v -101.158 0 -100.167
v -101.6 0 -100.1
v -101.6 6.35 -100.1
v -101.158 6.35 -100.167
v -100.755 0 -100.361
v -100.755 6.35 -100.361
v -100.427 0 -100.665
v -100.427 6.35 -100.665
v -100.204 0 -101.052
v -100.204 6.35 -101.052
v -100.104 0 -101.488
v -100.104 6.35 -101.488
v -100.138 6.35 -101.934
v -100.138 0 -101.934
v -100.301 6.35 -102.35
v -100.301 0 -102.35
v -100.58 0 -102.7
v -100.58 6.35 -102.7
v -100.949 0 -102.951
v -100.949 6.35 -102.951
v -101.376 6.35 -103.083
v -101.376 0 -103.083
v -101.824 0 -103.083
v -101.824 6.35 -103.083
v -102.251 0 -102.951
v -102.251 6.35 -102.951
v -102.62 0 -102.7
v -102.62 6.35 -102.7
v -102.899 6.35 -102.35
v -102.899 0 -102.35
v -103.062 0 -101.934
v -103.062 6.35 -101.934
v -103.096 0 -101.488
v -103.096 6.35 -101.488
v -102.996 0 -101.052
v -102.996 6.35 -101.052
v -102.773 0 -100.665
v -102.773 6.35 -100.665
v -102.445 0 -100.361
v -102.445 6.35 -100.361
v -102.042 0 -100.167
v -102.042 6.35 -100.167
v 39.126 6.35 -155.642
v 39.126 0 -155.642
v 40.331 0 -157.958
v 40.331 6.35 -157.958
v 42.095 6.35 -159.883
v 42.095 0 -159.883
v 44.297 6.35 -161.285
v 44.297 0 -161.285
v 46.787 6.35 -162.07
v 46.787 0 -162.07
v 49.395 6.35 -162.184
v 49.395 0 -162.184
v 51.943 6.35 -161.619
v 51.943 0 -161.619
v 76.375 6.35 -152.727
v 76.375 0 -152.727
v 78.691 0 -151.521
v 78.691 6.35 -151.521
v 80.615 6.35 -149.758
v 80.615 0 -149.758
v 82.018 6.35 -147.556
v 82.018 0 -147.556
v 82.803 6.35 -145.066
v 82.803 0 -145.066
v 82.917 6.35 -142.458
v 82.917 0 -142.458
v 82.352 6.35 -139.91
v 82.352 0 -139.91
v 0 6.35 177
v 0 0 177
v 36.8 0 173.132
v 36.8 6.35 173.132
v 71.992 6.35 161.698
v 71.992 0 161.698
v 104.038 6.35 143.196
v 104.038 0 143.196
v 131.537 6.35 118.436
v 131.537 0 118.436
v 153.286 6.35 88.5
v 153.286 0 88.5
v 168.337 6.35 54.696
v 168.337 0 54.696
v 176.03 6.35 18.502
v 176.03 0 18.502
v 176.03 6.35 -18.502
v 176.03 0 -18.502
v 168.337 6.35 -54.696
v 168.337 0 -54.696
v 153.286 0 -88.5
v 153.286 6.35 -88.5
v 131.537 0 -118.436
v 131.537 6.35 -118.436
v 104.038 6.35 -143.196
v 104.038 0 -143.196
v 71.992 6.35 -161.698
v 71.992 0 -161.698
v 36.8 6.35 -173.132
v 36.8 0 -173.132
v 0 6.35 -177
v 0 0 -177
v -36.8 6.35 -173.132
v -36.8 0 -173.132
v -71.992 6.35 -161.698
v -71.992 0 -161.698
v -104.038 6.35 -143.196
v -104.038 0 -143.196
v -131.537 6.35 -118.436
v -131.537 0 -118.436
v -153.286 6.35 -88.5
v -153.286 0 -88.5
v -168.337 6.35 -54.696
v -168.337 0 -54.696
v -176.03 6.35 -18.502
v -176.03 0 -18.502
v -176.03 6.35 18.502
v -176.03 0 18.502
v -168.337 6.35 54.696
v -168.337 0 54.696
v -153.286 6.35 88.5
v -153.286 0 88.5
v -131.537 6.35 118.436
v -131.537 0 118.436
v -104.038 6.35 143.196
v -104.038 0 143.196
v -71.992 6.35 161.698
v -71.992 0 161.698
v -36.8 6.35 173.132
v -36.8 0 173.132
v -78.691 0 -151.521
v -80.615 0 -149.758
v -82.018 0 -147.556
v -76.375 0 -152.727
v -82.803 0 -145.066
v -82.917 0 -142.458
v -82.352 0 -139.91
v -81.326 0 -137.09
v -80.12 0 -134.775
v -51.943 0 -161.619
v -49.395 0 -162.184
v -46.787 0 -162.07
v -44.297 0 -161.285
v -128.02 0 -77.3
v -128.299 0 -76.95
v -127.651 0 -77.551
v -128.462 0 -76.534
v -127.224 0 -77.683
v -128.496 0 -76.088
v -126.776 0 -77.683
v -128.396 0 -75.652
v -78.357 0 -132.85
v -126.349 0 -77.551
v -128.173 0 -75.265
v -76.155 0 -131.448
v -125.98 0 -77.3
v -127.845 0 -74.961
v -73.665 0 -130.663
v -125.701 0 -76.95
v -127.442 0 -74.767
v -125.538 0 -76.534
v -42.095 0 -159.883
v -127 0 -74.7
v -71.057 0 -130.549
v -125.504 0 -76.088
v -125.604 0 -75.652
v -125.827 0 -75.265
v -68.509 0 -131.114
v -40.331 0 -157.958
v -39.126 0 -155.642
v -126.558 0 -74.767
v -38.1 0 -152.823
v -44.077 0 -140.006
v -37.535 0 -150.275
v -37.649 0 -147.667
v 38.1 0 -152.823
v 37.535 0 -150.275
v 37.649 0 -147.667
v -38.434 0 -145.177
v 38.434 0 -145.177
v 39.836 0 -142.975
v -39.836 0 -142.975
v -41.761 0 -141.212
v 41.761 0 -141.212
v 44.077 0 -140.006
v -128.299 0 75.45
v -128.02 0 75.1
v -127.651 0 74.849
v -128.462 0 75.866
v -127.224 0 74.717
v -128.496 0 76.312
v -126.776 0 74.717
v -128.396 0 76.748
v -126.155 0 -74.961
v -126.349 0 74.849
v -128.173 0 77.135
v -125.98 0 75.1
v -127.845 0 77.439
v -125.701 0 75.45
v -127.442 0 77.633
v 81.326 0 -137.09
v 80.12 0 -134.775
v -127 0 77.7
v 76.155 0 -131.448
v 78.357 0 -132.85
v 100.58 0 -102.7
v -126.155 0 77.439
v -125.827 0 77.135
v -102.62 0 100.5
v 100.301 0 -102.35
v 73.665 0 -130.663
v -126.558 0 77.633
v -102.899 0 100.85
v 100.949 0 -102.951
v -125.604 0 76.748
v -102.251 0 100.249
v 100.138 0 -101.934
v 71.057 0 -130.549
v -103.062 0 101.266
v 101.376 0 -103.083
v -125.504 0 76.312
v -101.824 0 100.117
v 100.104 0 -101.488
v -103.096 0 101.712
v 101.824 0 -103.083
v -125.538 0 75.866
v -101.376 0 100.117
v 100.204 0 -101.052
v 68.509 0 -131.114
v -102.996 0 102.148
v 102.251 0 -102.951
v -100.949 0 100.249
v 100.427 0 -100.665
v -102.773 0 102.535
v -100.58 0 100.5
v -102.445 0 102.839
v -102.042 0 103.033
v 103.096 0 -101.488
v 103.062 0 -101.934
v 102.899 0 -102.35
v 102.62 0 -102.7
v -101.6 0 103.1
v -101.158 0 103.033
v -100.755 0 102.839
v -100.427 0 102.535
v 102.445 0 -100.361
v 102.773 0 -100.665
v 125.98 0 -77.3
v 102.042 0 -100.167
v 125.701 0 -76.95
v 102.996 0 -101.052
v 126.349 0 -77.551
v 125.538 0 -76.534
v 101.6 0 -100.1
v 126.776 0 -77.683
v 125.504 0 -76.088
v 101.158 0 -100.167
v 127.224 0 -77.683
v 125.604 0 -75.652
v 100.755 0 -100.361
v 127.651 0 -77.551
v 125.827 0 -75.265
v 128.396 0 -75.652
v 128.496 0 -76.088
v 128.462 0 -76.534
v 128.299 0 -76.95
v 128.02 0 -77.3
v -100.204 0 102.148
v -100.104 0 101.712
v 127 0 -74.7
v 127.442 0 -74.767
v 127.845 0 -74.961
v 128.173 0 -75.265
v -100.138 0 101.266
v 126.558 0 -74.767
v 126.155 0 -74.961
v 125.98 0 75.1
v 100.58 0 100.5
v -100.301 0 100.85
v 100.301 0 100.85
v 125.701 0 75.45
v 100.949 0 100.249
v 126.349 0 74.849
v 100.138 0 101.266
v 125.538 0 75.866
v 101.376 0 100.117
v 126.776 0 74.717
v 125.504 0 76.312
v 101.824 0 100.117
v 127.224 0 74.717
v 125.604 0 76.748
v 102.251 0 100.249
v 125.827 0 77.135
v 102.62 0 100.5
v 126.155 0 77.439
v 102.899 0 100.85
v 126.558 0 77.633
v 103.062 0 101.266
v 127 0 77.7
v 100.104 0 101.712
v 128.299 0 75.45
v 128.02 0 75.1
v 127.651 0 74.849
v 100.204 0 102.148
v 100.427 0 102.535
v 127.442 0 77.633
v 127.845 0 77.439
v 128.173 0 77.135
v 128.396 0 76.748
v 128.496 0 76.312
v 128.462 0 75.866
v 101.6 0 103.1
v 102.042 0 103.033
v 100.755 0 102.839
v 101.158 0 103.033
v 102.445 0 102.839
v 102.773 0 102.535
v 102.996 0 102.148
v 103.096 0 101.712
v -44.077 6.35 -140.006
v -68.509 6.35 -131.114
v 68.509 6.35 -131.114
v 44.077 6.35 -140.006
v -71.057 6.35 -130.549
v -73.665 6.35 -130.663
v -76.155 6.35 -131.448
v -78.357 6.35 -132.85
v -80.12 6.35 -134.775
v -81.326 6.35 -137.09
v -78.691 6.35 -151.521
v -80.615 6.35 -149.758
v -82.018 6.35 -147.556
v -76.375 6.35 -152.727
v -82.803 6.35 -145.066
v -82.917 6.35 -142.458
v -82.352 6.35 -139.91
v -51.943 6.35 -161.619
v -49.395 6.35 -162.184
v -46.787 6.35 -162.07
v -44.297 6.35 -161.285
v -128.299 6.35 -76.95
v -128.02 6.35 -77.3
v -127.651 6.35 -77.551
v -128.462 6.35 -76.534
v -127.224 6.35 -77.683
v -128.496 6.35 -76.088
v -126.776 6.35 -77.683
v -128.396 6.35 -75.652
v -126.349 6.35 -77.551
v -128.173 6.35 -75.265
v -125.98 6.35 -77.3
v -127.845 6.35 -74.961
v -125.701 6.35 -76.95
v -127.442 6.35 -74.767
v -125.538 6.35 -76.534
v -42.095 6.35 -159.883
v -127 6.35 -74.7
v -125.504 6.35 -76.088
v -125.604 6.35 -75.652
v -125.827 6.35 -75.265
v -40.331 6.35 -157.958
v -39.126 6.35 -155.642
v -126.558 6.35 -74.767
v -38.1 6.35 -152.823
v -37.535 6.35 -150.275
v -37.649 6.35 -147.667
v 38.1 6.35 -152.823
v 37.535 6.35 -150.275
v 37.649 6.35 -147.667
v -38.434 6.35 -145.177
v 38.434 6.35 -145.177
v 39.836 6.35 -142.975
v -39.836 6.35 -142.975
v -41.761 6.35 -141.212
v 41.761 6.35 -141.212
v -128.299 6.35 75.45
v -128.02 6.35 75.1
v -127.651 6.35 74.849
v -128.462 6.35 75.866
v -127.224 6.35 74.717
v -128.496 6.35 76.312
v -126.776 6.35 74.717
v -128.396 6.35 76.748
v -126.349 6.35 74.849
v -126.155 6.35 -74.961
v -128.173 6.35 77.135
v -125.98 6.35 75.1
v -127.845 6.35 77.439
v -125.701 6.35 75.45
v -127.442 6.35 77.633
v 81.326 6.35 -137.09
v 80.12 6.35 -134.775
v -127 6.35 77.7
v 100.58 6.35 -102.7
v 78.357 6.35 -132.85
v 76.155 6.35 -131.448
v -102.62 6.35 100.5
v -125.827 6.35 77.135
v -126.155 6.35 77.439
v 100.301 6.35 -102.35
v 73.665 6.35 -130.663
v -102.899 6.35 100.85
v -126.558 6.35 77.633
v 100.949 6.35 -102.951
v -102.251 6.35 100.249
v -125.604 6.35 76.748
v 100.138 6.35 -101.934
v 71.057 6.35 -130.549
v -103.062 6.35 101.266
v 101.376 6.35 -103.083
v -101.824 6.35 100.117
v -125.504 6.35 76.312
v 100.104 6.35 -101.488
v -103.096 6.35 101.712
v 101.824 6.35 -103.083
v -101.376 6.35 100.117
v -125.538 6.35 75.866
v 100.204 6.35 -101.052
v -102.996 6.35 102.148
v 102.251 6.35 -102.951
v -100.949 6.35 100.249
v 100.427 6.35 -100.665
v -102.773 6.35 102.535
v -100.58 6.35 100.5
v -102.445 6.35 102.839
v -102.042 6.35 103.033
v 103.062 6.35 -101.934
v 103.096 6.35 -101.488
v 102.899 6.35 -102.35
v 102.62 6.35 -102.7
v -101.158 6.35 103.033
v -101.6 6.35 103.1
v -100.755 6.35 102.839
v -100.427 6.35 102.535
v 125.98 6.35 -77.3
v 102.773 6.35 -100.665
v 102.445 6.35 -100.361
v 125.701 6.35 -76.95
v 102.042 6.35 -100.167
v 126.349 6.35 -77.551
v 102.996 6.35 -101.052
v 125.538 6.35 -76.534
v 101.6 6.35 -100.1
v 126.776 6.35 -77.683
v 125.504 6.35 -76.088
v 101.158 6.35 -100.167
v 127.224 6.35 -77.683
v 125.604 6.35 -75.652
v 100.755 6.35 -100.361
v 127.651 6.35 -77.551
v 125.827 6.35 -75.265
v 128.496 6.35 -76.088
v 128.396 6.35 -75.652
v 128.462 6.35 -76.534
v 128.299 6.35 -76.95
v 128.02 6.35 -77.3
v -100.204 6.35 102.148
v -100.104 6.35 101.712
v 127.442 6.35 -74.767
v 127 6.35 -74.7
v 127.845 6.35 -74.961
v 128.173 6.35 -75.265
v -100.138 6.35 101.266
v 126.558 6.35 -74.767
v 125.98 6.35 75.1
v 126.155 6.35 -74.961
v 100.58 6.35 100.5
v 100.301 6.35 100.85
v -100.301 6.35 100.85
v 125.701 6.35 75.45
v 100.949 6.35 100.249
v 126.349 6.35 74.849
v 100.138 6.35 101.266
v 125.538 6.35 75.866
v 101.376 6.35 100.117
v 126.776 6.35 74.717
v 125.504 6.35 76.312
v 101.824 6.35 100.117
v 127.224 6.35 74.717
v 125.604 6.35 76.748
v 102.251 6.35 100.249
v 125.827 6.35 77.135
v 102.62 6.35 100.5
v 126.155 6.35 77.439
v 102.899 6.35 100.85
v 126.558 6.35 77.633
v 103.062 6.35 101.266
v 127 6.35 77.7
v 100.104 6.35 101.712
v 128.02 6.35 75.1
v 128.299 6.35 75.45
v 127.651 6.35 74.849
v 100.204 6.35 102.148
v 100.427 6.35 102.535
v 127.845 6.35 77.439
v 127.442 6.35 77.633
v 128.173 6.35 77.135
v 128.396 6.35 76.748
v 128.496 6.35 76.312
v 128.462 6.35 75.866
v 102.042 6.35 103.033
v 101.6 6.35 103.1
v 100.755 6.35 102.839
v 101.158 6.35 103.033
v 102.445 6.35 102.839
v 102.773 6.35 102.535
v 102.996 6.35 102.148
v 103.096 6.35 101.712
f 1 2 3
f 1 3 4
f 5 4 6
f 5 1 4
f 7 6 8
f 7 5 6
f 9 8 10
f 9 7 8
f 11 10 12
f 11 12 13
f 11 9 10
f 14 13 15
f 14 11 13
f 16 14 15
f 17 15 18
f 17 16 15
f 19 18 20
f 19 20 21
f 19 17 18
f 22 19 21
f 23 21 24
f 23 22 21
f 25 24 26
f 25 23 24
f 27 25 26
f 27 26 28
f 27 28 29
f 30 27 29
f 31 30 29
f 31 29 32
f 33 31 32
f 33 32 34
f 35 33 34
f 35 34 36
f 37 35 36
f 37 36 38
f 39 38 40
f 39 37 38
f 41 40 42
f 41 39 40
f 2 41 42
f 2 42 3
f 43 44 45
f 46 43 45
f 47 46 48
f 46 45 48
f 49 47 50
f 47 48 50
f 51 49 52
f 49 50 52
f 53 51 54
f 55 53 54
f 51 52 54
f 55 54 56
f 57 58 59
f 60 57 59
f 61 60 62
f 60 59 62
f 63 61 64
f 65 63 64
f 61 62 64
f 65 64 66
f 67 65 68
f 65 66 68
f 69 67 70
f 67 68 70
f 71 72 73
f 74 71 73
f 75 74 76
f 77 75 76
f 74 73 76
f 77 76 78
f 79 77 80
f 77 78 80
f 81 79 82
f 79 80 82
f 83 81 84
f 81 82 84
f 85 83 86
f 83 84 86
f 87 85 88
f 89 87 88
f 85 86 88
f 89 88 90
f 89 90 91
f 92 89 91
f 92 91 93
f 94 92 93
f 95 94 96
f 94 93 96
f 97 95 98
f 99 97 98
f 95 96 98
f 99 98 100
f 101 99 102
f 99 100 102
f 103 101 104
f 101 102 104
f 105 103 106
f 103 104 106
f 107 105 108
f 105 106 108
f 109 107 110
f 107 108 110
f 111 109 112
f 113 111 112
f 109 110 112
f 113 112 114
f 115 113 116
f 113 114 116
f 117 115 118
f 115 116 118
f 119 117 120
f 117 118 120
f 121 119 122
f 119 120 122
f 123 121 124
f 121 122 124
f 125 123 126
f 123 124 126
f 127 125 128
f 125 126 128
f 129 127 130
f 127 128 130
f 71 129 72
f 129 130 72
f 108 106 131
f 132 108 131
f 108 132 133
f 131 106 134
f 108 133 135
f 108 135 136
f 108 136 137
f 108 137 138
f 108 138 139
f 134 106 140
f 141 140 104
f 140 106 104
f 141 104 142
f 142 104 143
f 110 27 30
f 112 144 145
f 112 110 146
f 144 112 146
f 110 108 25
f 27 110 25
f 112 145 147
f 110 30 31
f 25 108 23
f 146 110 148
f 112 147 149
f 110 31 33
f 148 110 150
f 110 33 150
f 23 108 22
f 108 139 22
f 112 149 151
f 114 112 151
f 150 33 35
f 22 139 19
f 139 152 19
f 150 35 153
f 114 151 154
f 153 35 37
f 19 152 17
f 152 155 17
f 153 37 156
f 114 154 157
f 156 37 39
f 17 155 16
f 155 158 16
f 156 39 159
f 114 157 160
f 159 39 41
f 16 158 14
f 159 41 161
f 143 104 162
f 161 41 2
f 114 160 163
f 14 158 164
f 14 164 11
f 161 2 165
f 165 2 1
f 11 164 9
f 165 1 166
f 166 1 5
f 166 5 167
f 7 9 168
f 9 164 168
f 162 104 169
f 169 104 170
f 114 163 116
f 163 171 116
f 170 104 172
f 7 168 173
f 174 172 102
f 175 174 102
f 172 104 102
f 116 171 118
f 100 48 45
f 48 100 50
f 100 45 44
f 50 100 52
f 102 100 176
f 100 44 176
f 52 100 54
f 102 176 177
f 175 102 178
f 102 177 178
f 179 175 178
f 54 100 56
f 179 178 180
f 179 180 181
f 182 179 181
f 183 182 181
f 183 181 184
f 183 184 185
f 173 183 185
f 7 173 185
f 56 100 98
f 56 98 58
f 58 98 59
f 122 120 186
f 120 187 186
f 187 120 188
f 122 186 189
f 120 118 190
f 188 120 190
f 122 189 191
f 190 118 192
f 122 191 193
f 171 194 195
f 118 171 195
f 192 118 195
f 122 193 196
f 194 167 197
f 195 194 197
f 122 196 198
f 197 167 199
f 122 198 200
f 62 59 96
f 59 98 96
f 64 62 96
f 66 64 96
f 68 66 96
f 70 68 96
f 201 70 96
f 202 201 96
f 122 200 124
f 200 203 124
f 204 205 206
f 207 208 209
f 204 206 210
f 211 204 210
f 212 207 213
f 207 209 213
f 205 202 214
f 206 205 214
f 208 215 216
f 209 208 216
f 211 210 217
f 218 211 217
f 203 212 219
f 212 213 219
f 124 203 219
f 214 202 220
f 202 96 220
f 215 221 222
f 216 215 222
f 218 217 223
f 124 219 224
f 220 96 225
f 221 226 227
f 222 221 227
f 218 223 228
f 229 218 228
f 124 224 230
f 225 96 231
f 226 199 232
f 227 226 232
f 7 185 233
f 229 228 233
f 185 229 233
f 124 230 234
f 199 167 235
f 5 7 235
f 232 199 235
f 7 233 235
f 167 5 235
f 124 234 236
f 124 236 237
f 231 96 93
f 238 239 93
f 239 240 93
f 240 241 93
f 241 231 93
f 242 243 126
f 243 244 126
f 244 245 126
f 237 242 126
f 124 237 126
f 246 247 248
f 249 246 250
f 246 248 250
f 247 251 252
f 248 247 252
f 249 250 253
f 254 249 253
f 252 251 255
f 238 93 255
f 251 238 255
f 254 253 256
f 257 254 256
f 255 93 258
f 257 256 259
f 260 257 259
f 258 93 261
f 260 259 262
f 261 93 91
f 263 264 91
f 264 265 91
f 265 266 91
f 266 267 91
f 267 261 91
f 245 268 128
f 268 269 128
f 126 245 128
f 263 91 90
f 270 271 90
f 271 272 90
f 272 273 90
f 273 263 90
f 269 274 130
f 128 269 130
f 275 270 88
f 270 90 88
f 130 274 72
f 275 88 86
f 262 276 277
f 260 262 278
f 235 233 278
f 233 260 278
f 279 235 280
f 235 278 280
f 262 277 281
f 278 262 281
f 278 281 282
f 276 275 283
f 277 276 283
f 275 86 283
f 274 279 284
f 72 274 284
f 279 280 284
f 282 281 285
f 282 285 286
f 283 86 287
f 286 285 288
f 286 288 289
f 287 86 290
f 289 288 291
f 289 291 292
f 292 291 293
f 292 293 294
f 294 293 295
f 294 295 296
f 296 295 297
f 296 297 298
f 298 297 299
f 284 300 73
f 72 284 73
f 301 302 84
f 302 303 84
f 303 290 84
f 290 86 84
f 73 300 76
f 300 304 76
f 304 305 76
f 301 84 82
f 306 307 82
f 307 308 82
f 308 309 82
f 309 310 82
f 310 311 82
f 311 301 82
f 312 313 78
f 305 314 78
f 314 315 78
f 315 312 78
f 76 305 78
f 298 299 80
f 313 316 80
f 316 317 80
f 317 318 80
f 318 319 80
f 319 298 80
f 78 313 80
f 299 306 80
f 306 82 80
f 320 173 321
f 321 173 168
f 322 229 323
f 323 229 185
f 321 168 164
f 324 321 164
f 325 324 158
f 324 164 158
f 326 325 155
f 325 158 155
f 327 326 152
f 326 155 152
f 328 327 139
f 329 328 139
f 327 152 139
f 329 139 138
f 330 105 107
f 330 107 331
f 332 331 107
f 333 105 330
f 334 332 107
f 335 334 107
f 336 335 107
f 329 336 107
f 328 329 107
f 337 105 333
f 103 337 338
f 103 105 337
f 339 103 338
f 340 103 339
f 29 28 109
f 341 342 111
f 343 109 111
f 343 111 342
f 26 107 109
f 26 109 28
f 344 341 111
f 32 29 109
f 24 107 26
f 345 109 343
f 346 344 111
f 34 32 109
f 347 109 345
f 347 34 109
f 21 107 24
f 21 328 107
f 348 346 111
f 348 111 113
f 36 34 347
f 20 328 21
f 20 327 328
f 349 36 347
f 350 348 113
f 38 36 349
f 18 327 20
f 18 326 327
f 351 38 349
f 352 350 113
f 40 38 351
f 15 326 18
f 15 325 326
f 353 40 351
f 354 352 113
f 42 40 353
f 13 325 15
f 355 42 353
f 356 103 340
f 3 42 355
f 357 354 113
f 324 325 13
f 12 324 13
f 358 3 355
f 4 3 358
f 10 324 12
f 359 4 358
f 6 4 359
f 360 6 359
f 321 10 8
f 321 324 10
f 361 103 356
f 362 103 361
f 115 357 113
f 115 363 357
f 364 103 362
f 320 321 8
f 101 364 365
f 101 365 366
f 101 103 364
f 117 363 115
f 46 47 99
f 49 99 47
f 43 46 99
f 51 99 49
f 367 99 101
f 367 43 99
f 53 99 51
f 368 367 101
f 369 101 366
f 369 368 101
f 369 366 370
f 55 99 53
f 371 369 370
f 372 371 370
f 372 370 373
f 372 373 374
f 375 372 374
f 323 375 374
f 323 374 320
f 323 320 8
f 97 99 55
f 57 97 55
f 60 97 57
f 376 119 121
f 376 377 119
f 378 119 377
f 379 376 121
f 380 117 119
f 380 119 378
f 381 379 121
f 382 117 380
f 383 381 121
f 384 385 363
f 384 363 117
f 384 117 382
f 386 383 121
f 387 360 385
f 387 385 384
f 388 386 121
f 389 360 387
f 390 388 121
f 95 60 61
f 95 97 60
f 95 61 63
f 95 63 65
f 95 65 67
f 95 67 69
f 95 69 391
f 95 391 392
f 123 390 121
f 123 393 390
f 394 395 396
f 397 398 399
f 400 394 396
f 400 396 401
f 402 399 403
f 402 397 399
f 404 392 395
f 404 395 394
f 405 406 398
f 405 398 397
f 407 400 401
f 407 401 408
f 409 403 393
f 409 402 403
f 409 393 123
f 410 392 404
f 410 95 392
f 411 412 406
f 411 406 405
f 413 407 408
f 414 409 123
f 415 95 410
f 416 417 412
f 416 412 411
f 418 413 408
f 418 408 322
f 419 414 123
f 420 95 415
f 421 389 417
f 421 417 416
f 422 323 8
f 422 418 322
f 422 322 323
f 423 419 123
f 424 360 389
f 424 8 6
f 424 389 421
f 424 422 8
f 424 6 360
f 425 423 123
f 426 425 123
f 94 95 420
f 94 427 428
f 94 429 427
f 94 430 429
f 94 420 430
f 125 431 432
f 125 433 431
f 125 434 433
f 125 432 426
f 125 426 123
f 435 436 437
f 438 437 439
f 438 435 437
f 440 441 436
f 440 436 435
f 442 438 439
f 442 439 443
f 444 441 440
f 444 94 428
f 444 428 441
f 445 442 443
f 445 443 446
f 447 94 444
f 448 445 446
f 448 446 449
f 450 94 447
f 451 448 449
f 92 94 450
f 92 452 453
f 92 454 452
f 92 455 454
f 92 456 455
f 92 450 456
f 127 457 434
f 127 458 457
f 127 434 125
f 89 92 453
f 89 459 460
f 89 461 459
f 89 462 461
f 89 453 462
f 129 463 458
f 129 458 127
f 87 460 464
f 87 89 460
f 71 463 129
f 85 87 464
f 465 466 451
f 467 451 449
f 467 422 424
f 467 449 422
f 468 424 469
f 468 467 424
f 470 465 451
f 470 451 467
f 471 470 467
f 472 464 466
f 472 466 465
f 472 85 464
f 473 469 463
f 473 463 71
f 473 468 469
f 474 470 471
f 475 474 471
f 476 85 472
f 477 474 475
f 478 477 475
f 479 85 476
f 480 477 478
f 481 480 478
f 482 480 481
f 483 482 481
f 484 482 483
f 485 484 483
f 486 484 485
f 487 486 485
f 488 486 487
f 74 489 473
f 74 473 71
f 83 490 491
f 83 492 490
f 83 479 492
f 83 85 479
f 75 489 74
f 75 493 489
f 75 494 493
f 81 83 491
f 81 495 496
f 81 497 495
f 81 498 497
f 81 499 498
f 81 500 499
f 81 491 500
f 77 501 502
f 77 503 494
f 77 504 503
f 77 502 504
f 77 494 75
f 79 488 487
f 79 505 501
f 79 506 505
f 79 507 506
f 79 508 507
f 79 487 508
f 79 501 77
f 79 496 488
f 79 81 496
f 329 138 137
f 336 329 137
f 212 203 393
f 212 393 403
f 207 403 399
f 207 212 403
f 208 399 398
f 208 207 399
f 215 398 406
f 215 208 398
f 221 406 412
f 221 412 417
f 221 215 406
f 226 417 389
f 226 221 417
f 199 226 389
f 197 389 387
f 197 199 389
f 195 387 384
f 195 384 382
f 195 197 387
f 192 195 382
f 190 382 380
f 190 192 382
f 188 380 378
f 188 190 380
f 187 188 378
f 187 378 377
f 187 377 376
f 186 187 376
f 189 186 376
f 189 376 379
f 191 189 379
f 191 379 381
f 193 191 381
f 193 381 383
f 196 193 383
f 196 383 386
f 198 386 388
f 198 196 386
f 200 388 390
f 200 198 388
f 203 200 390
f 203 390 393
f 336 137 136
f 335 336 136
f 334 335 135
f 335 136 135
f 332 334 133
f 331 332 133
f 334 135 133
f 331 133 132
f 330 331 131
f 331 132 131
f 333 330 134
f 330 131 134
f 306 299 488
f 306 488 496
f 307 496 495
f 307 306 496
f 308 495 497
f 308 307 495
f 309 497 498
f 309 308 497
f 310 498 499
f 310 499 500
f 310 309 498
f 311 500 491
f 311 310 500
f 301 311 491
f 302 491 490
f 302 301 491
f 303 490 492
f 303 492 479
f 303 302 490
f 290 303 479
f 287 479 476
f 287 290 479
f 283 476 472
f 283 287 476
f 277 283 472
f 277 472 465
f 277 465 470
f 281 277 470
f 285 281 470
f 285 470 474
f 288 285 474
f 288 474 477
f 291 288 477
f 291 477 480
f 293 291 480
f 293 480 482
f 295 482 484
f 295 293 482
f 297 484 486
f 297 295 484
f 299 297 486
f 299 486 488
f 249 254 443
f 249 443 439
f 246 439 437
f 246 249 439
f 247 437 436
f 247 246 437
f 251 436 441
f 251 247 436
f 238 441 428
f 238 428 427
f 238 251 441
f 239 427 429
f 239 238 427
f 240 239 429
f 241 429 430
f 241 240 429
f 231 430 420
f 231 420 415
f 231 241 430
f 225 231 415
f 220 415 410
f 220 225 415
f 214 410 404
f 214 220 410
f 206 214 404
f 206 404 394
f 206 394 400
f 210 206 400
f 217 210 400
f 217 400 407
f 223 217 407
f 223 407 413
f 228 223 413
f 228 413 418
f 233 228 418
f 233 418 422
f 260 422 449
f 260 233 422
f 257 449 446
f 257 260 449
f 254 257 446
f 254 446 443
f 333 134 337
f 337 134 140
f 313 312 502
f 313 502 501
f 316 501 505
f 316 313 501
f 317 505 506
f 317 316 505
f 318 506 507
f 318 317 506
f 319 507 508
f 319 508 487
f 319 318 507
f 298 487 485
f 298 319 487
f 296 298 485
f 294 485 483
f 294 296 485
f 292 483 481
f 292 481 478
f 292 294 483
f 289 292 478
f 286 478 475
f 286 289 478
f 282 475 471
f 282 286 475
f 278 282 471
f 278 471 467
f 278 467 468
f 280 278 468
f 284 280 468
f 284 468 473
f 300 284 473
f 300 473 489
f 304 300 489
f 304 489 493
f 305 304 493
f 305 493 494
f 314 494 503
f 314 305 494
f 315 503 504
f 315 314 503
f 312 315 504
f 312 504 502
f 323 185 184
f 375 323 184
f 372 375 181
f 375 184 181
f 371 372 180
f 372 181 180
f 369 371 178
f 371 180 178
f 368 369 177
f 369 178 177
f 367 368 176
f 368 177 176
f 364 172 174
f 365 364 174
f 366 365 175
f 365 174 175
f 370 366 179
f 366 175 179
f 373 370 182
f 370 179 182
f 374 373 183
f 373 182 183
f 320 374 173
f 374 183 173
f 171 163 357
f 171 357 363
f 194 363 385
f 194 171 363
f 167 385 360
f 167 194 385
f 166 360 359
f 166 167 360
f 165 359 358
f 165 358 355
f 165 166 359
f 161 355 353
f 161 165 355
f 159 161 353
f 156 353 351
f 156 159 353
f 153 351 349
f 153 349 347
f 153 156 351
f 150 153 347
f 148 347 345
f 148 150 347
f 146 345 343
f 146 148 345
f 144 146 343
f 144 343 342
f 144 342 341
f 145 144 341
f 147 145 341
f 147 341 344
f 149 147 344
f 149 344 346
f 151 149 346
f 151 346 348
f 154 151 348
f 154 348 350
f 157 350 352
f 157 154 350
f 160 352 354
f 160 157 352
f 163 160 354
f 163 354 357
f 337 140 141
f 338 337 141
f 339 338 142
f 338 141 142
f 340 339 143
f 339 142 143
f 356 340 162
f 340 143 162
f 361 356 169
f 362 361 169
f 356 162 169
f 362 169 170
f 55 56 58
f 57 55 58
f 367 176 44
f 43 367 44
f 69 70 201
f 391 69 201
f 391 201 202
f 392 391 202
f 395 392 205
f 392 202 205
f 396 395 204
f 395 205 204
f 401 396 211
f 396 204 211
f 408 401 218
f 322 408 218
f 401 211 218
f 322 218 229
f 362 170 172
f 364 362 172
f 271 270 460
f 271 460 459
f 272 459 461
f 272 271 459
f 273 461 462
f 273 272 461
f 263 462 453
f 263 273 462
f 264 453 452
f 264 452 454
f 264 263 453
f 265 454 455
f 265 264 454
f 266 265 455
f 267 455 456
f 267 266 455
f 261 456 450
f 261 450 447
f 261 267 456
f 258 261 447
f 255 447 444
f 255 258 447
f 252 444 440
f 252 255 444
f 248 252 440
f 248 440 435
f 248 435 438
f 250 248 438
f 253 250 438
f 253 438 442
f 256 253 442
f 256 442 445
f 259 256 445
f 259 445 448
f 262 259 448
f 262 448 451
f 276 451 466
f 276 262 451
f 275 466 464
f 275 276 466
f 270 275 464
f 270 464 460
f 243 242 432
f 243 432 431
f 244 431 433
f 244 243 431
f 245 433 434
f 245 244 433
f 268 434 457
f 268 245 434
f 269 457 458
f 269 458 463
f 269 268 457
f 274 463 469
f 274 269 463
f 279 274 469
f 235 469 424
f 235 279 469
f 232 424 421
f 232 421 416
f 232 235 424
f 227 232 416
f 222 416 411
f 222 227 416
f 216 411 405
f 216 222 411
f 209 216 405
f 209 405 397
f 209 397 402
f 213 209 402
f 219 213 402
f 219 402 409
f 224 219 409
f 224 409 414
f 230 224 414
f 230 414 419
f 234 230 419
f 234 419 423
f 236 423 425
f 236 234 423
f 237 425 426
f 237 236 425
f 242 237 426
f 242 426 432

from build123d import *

# Parameters (mm, degrees)
SKETCH1_R           = 177
SKETCH1_R_2         = 1.5
BOSS_EXTRUDE1_DEPTH = 6.35


with BuildPart() as part:
    # Sketch1 → Boss-Extrude1 (new body)
    with BuildSketch(Plane(origin=(0, 0, 0), x_dir=(1, 0, 0), z_dir=(0, 1, 0))):
        with Locations(Location((0, 0, 0), (0, 0, 270))):
            Circle(SKETCH1_R)
        with Locations(Location((-101.6, -101.6, 0), (0, 0, 270))):
            Circle(SKETCH1_R_2, mode=Mode.SUBTRACT)
        with Locations(Location((-101.6, 101.6, 0), (0, 0, 270))):
            Circle(SKETCH1_R_2, mode=Mode.SUBTRACT)
        with Locations(Location((101.6, 101.6, 0), (0, 0, 270))):
            Circle(SKETCH1_R_2, mode=Mode.SUBTRACT)
        with Locations(Location((101.6, -101.6, 0), (0, 0, 270))):
            Circle(SKETCH1_R_2, mode=Mode.SUBTRACT)
        with Locations(Location((-127, 76.2, 0), (0, 0, 270))):
            Circle(SKETCH1_R_2, mode=Mode.SUBTRACT)
        with Locations(Location((127, 76.2, 0), (0, 0, 270))):
            Circle(SKETCH1_R_2, mode=Mode.SUBTRACT)
        with Locations(Location((127, -76.2, 0), (0, 0, 270))):
            Circle(SKETCH1_R_2, mode=Mode.SUBTRACT)
        with Locations(Location((-127, -76.2, 0), (0, 0, 270))):
            Circle(SKETCH1_R_2, mode=Mode.SUBTRACT)
        with BuildLine():
            Line((-76.375196212, 152.726666572), (-51.943188071, 161.619190299))
            ThreePointArc((-51.943188071, 161.619190299), (-44.29680402, 161.285341961), (-39.12606043, 155.642465524))
            Line((-39.12606043, 155.642465524), (-38.1, 152.823387662))
            ThreePointArc((-38.1, 152.823387662), (-38.433848337, 145.177003611), (-44.076724775, 140.006260021))
            Line((-44.076724775, 140.006260021), (-68.508732915, 131.113736294))
            ThreePointArc((-68.508732915, 131.113736294), (-76.155116966, 131.447584632), (-81.325860556, 137.090461069))
            Line((-81.325860556, 137.090461069), (-82.351920986, 139.909538931))
            ThreePointArc((-82.351920986, 139.909538931), (-82.018072649, 147.555922982), (-76.375196212, 152.726666572))
        make_face(mode=Mode.SUBTRACT)
        with BuildLine():
            Line((51.943188071, 161.619190299), (76.375196212, 152.726666572))
            ThreePointArc((76.375196212, 152.726666572), (82.018072649, 147.555922982), (82.351920986, 139.909538931))
            Line((82.351920986, 139.909538931), (81.325860556, 137.090461069))
            ThreePointArc((81.325860556, 137.090461069), (76.155116966, 131.447584632), (68.508732915, 131.113736294))
            Line((68.508732915, 131.113736294), (44.076724775, 140.006260021))
            ThreePointArc((44.076724775, 140.006260021), (38.433848337, 145.177003611), (38.1, 152.823387662))
            Line((38.1, 152.823387662), (39.12606043, 155.642465524))
            ThreePointArc((39.12606043, 155.642465524), (44.29680402, 161.285341961), (51.943188071, 161.619190299))
        make_face(mode=Mode.SUBTRACT)
    extrude(amount=BOSS_EXTRUDE1_DEPTH)


solid = part.part
